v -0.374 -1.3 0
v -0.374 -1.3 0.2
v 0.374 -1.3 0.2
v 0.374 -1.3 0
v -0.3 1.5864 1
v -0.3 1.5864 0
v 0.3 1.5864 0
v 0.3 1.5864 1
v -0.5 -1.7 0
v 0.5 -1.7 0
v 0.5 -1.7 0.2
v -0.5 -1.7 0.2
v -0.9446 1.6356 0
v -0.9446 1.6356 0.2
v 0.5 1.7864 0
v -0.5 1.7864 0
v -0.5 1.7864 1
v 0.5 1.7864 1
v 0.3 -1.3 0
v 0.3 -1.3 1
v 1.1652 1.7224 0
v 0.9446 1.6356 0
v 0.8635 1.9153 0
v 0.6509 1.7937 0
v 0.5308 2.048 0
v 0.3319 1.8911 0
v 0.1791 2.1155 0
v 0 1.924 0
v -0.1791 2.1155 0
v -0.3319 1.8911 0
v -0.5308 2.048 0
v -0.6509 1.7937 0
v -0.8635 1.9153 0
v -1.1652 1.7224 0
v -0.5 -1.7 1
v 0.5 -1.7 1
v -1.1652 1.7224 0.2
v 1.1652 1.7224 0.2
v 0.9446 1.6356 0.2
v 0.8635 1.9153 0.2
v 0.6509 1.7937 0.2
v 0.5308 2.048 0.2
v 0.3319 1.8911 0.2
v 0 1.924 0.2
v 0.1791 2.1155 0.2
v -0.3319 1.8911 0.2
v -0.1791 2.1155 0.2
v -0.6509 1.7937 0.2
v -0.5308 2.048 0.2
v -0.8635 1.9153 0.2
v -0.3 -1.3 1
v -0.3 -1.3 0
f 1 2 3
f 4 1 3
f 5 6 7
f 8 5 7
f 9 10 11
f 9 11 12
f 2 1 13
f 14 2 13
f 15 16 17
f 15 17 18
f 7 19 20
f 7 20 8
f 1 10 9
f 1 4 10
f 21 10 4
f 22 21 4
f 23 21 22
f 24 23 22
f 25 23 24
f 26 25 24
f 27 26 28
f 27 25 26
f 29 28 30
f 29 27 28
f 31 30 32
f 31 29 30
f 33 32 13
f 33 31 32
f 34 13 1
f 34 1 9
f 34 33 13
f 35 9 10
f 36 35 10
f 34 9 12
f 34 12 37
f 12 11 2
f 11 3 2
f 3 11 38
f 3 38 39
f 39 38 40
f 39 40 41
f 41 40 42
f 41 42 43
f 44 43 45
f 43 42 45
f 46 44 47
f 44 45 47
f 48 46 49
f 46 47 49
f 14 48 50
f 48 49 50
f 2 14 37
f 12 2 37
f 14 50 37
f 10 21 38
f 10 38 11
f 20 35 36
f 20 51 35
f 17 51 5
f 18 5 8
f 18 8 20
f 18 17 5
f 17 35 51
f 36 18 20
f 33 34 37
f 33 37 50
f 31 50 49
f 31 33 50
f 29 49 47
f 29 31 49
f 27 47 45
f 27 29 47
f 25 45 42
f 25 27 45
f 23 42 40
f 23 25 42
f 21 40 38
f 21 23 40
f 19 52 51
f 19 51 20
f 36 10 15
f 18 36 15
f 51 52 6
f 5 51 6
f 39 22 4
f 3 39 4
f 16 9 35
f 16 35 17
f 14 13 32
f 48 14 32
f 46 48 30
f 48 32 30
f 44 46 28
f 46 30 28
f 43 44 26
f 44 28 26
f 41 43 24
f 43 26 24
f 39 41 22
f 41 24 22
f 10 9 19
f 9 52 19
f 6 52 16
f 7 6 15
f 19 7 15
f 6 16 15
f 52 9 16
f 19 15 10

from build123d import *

# Parameters (mm, degrees)
BOSS_EXTRUDE1_DEPTH = 0.2
BOSS_EXTRUDE2_DEPTH = 0.2
SKETCH4_W           = 1
SKETCH4_H           = 3.486416791
SKETCH4_W_2         = 0.6
SKETCH4_H_2         = 2.886416791
BOSS_EXTRUDE3_DEPTH = 1


with BuildPart() as part:
    # Sketch1 → Boss-Extrude1 (new body)
    with BuildSketch(Plane.XY):
        with BuildLine():
            Line((-0.5, -1.7), (-1.165239685, 1.722361495))
            ThreePointArc((-1.165239685, 1.722361495), (0, 2.123983376), (1.165239685, 1.722361495))
            Line((1.165239685, 1.722361495), (0.5, -1.7))
            Line((0.5, -1.7), (-0.5, -1.7))
        make_face()
        with BuildLine():
            Line((-0.335132723, -1.5), (-0.944627099, 1.635576741))
            ThreePointArc((-0.944627099, 1.635576741), (0, 1.923983376), (0.944627099, 1.635576741))
            Line((0.944627099, 1.635576741), (0.335132723, -1.5))
            Line((0.335132723, -1.5), (-0.335132723, -1.5))
        make_face(mode=Mode.SUBTRACT)
    extrude(amount=BOSS_EXTRUDE1_DEPTH)

    # Sketch3 → Boss-Extrude2 (add)
    with BuildSketch(Plane.XY.offset(0.2)):
        Polygon((-0.374008785, -1.3), (0.374008785, -1.3), (0.335132723, -1.5), (-0.335132723, -1.5), align=None)
    extrude(amount=-BOSS_EXTRUDE2_DEPTH)


with BuildPart() as body_2:
    # Sketch4 → Boss-Extrude3 (new body)
    with BuildSketch(Plane.XY):
        with Locations((0, 0.043208395)):
            Rectangle(SKETCH4_W, SKETCH4_H)
        with Locations((0, 0.143208395)):
            Rectangle(SKETCH4_W_2, SKETCH4_H_2, mode=Mode.SUBTRACT)
    extrude(amount=BOSS_EXTRUDE3_DEPTH)


solid = Compound([part.part, body_2.part])
